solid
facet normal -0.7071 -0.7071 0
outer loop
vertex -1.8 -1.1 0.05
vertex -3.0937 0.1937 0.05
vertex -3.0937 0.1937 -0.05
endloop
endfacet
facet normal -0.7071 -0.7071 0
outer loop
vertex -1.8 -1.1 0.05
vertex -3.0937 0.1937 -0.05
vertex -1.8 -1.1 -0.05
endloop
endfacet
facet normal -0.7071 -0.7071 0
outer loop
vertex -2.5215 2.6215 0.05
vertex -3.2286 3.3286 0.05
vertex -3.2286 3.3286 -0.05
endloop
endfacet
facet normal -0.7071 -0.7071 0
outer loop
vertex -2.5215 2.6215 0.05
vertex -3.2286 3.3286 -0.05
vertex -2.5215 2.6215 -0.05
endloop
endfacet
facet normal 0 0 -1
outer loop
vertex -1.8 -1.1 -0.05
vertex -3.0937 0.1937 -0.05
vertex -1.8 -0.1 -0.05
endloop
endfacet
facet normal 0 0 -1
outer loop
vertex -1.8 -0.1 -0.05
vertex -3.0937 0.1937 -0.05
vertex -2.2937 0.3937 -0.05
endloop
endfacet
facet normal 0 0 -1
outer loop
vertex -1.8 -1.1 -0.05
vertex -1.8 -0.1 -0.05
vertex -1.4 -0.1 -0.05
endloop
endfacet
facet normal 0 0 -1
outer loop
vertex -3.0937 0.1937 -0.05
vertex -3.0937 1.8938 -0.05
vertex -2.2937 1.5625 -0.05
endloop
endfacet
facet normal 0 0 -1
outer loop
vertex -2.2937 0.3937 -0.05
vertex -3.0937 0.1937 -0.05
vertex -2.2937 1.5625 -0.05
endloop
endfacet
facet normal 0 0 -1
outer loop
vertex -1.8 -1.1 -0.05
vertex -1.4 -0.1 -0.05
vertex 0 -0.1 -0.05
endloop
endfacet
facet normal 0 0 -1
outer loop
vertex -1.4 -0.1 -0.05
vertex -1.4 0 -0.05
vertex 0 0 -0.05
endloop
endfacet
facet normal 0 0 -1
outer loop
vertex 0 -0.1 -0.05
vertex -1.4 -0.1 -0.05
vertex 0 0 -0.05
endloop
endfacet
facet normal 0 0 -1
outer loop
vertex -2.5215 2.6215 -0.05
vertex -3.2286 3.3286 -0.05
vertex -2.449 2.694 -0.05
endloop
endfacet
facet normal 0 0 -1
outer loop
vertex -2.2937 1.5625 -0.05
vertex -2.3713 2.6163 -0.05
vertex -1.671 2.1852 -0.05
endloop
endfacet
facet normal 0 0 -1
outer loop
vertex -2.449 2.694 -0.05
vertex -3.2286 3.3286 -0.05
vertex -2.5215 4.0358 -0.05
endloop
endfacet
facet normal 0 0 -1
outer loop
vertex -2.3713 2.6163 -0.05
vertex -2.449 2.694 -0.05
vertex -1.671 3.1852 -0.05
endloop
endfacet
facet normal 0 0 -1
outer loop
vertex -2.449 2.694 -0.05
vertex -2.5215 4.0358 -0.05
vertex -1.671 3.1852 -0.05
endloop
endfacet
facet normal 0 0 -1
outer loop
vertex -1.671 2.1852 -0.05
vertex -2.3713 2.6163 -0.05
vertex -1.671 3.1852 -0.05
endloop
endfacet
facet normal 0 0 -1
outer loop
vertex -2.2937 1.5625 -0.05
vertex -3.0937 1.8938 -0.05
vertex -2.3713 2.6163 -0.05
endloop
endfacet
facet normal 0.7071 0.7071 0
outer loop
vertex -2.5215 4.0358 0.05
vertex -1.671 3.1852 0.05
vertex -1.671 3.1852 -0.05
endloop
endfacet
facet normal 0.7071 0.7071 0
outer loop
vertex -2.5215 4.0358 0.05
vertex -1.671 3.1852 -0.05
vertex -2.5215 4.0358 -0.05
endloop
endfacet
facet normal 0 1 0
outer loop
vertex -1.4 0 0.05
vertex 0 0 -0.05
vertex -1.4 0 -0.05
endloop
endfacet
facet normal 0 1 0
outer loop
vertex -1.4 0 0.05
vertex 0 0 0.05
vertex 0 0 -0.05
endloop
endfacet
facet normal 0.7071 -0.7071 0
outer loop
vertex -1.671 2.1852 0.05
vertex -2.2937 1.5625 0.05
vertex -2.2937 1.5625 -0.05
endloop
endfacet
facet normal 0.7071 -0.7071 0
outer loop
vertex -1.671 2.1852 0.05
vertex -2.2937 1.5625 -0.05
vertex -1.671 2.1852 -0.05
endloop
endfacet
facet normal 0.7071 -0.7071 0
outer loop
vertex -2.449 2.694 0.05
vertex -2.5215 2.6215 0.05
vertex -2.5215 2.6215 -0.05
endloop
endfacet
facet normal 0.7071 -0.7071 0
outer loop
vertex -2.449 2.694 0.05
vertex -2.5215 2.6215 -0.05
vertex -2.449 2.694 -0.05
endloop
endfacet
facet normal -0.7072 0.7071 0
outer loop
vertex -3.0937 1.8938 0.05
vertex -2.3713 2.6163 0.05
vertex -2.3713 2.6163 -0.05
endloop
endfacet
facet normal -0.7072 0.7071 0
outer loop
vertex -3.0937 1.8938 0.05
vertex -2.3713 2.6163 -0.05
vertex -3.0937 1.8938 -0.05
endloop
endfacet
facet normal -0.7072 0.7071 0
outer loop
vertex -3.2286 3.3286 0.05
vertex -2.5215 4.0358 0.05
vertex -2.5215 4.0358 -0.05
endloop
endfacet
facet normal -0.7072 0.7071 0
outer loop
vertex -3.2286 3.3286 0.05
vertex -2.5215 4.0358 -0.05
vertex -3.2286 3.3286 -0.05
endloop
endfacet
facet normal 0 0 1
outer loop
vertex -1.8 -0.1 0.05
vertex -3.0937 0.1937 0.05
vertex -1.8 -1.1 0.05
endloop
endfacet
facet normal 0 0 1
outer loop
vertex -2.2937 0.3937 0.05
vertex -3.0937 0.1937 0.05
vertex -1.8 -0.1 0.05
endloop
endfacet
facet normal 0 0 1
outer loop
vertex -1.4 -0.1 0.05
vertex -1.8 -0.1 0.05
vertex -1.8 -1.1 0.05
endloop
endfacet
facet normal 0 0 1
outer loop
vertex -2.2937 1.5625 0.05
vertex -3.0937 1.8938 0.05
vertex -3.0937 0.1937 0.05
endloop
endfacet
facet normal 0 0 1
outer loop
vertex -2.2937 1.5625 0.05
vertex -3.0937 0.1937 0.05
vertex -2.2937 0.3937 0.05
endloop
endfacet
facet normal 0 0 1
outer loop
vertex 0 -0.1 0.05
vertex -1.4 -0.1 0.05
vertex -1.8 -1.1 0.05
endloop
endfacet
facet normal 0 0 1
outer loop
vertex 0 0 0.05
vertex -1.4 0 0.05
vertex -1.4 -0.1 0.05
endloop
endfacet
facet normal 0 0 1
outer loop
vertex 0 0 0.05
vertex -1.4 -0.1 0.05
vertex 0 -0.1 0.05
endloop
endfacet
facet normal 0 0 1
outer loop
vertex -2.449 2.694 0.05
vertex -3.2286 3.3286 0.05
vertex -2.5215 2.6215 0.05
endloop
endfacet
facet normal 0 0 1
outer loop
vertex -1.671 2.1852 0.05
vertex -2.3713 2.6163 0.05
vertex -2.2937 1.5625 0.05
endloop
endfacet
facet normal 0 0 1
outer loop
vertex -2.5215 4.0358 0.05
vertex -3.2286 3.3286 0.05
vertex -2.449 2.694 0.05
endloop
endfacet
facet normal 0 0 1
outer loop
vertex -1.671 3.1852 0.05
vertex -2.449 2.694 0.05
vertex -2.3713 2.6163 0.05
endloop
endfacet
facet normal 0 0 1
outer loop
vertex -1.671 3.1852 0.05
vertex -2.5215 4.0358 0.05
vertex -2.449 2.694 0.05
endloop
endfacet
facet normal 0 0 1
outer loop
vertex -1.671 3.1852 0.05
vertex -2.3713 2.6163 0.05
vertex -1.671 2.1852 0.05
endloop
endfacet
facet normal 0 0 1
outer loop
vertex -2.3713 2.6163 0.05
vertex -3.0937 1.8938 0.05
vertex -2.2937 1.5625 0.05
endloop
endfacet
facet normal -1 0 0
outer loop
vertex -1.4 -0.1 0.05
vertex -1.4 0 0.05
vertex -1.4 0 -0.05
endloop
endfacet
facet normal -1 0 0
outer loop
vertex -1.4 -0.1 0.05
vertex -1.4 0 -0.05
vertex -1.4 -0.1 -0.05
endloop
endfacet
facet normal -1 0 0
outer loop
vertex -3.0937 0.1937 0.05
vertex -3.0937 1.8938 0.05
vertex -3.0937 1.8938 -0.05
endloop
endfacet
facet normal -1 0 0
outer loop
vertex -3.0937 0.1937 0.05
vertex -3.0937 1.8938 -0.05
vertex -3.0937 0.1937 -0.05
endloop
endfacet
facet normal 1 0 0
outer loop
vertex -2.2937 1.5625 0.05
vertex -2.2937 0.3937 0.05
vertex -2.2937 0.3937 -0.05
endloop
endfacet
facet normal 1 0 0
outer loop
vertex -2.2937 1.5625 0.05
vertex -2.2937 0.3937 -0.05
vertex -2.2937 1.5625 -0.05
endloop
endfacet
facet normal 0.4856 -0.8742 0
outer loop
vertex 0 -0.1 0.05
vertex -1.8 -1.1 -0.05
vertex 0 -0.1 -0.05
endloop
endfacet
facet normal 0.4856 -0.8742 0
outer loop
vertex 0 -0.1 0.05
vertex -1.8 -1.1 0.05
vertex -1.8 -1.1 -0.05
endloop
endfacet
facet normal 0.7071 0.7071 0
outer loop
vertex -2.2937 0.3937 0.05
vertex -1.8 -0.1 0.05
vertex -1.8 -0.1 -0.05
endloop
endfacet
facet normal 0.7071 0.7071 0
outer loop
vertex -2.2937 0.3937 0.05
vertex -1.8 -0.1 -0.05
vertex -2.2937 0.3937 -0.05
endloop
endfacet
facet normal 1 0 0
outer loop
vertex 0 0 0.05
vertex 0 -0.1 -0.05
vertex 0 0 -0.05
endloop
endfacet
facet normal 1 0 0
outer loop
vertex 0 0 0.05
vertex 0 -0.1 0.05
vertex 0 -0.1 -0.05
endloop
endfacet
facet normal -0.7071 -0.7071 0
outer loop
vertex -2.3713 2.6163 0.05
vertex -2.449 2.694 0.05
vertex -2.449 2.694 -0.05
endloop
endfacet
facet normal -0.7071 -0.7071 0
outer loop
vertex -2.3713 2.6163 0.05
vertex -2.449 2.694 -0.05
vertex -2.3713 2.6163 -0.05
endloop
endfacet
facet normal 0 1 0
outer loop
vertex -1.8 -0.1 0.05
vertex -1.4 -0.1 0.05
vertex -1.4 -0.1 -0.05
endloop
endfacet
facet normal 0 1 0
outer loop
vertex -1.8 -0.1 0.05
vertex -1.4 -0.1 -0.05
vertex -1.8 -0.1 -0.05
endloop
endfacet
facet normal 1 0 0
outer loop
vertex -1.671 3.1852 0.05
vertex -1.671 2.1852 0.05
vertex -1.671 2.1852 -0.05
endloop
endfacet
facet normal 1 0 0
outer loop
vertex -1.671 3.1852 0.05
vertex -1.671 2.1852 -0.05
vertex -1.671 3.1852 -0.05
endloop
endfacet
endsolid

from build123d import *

# Parameters (mm, degrees)
BOSS_EXTRUDE1_DEPTH = 0.05


with BuildPart() as part:
    # Sketch1 → Boss-Extrude1 (new, symmetric)
    with BuildSketch(Plane.XY):
        Polygon((0, 0), (-1.4, 0), (-1.4, -0.1), (-1.8, -0.1), (-2.293725624, 0.393725624), (-2.293725624, 1.562470542), (-1.670991302, 2.185204865), (-1.670991302, 3.185204865), (-2.521542086, 4.035755648), (-3.228648867, 3.328648867), (-2.521542086, 2.621542086), (-2.449038167, 2.694046004), (-2.37127959, 2.616287427), (-3.093725624, 1.893841392), (-3.093725624, 0.193725624), (-1.8, -1.1), (0, -0.1), align=None)
    extrude(amount=BOSS_EXTRUDE1_DEPTH, both=True)


solid = part.part
